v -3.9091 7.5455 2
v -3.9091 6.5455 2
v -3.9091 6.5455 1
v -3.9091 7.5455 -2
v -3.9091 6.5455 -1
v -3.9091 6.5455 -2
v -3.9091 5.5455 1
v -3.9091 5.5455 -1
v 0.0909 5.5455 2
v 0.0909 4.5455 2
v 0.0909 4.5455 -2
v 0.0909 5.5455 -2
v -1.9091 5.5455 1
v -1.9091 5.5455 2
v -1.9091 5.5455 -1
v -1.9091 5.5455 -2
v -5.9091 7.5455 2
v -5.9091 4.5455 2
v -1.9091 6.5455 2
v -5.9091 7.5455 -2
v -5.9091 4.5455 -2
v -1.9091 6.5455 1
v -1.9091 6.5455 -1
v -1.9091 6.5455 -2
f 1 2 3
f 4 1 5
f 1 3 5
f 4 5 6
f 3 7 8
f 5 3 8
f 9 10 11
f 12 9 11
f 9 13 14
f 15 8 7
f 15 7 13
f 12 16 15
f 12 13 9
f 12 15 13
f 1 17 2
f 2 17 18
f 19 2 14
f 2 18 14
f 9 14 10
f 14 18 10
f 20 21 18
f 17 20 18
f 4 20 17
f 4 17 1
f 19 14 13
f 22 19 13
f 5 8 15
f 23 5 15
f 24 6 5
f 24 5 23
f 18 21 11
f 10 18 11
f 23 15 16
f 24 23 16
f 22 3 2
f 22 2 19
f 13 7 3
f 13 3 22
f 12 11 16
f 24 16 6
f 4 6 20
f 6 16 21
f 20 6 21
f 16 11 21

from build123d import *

# Parameters (mm, degrees)
SKETCH_1_W      = 30
SKETCH_1_H      = 20
EXTRUDE_1_DEPTH = 5
EXTRUDE_2_DEPTH = 10
EXTRUDE_3_DEPTH = 15
SCALE_1_SCALE   = 0.2


with BuildPart() as part:
    # 草圖1 → 填料-伸長1 (new body)
    with BuildSketch(Plane(origin=(0, 0, 0), x_dir=(1, 0, 0), z_dir=(0, 1, 0))):
        Rectangle(SKETCH_1_W, SKETCH_1_H)
    extrude(amount=EXTRUDE_1_DEPTH)

    # 草圖1<3> → 填料-伸長2 (add)
    with BuildSketch(Plane(origin=(0, 0, 0), x_dir=(1, 0, 0), z_dir=(0, 1, 0))):
        Polygon((5, 10), (-15, 10), (-15, -10), (5, -10), (5, -5), (-5, -5), (-5, 5), (5, 5), align=None)
    extrude(amount=EXTRUDE_2_DEPTH)

    # 草圖1<4> → 填料-伸長3 (add)
    with BuildSketch(Plane(origin=(0, 0, 0), x_dir=(1, 0, 0), z_dir=(0, 1, 0))):
        Polygon((-5, 5), (-5, 10), (-15, 10), (-15, -10), (-5, -10), (-5, -5), align=None)
    extrude(amount=EXTRUDE_3_DEPTH)


with BuildPart() as part_1:
    # 縮放比例1: scaled about (-3.636363636, 5.681818182, 0)
    add(part.part.scale(SCALE_1_SCALE).moved(Location((-2.909090909, 4.545454546, 0))))


solid = part_1.part
